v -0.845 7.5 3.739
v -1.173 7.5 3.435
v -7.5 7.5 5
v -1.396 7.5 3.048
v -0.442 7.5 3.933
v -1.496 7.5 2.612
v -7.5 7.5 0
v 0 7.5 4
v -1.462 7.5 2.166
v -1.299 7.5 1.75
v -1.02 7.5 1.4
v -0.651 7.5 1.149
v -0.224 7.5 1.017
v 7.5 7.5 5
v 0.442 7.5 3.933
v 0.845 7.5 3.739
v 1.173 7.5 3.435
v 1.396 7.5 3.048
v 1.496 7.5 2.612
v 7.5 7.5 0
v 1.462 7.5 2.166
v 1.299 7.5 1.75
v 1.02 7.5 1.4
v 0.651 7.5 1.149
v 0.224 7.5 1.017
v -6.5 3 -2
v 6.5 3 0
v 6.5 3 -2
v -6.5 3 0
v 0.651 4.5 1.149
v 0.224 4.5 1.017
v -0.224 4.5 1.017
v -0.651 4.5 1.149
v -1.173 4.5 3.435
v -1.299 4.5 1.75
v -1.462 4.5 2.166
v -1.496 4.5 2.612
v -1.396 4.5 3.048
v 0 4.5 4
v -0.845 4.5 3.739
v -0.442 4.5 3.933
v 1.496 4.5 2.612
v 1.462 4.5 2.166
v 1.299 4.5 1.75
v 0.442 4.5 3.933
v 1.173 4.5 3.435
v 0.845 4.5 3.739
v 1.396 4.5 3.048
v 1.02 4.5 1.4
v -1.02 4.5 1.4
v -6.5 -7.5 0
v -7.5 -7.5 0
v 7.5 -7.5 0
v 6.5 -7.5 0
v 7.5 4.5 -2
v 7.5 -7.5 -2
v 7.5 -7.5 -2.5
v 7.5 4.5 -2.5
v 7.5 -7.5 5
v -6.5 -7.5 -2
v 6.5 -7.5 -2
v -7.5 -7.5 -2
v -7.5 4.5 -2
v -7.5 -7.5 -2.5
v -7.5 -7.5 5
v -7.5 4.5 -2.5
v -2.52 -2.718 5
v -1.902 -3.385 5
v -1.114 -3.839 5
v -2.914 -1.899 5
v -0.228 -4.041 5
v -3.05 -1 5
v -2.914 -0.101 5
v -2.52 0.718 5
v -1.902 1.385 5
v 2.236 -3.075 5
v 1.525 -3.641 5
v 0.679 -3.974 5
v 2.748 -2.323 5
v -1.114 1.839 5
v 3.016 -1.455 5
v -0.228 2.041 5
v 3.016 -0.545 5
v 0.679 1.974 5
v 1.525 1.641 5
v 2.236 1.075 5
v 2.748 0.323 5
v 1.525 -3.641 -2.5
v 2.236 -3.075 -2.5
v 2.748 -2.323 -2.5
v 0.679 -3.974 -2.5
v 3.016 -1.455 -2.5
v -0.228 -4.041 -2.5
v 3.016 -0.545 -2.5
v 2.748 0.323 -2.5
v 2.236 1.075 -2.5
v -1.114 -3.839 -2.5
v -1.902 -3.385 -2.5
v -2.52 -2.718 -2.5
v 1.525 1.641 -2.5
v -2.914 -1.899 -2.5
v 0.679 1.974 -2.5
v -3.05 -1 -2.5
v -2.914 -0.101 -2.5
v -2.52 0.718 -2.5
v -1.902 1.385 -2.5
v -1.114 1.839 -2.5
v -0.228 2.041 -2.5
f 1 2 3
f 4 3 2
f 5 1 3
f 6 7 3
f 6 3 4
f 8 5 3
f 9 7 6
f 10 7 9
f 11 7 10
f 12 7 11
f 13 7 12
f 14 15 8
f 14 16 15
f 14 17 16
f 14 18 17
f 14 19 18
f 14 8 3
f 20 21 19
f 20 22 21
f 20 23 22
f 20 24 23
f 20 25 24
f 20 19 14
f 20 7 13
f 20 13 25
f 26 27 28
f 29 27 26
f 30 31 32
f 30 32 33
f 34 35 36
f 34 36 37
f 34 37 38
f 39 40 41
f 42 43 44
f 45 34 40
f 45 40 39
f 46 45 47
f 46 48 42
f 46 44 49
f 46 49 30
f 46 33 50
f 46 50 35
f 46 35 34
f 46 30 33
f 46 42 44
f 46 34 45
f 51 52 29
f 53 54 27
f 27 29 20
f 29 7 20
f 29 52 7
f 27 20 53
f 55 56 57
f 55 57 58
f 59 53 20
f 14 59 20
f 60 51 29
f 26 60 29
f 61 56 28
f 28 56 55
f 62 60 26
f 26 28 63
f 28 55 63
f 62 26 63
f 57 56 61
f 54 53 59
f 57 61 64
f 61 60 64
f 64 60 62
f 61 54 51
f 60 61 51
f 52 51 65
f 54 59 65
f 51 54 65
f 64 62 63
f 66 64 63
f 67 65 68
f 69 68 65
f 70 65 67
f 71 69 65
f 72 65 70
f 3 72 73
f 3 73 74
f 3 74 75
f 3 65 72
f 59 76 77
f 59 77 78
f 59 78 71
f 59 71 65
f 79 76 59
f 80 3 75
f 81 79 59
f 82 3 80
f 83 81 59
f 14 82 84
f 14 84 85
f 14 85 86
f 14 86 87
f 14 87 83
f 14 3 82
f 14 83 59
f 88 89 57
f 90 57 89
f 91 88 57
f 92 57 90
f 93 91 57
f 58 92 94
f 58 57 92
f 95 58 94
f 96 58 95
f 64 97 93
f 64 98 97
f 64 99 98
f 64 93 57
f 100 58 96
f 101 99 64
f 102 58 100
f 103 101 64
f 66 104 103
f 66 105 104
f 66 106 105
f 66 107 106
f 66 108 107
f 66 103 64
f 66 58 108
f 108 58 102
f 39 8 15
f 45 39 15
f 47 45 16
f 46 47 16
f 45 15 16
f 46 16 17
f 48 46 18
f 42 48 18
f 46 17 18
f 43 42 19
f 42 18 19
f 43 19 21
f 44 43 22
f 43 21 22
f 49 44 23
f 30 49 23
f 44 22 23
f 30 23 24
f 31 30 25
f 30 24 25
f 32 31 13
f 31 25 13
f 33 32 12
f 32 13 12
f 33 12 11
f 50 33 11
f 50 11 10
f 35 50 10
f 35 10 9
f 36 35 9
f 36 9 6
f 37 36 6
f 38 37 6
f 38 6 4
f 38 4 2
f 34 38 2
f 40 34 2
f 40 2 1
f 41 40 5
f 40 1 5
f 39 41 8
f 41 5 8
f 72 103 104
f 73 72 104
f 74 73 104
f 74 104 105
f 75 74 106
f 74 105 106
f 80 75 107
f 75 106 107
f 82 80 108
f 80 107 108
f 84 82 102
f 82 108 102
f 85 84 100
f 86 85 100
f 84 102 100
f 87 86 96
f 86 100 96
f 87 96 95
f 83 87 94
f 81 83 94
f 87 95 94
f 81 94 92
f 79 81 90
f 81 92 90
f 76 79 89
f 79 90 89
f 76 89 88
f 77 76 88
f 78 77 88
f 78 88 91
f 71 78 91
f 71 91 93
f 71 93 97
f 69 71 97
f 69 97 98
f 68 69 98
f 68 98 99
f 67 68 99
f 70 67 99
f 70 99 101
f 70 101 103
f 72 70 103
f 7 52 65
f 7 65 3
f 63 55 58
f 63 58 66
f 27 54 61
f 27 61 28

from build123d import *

# Parameters (mm, degrees)
ESQUISSE1_W             = 15
ESQUISSE1_H             = 15
BOSS_EXTRU_1_DEPTH      = 5
ESQUISSE2_R             = 1.5
ENL_V_MAT_EXTRU_1_DEPTH = 3
ESQUISSE3_W             = 13
ESQUISSE3_H             = 10.5
BOSS_EXTRU_2_DEPTH      = 2
ESQUISSE4_W             = 15
ESQUISSE4_H             = 12
BOSS_EXTRU_3_DEPTH      = 0.5
ESQUISSE5_R             = 3.05
ENL_V_MAT_EXTRU_2_DEPTH = 1
ESQUISSE5_3_R           = 3.05
ENL_V_MAT_EXTRU_3_DEPTH = 15


with BuildPart() as part:
    # Esquisse1 → Boss.-Extru.1 (new body)
    with BuildSketch(Plane.XY):
        Rectangle(ESQUISSE1_W, ESQUISSE1_H)
    extrude(amount=BOSS_EXTRU_1_DEPTH)

    # Esquisse2 → Enlèv. mat.-Extru.1 (cut)
    with BuildSketch(Plane(origin=(0, 7.5, 0), x_dir=(1, 0, 0), z_dir=(0, 1, 0))):
        with Locations((0, -2.5)):
            Circle(ESQUISSE2_R)
    extrude(amount=-ENL_V_MAT_EXTRU_1_DEPTH, mode=Mode.SUBTRACT)

    # Esquisse3 → Boss.-Extru.2 (add)
    with BuildSketch(Plane(origin=(0, 0, 0), x_dir=(-1, 0, 0), z_dir=(0, 0, -1))):
        with Locations((0, -2.25)):
            Rectangle(ESQUISSE3_W, ESQUISSE3_H)
    extrude(amount=BOSS_EXTRU_2_DEPTH)

    # Esquisse4 → Boss.-Extru.3 (add)
    with BuildSketch(Plane(origin=(0, 0, -2), x_dir=(-1, 0, 0), z_dir=(0, 0, -1))):
        with Locations((0, -1.5)):
            Rectangle(ESQUISSE4_W, ESQUISSE4_H)
    extrude(amount=BOSS_EXTRU_3_DEPTH)

    # Esquisse5 → Enlèv. mat.-Extru.2 (cut)
    with BuildSketch(Plane(origin=(0, 0, -2.5), x_dir=(-1, 0, 0), z_dir=(0, 0, -1))):
        with Locations((0, -1)):
            Circle(ESQUISSE5_R)
    extrude(amount=-ENL_V_MAT_EXTRU_2_DEPTH, mode=Mode.SUBTRACT)

    # Esquisse5<3> → Enlèv. mat.-Extru.3 (cut)
    with BuildSketch(Plane(origin=(0, 0, -2.5), x_dir=(-1, 0, 0), z_dir=(0, 0, -1))):
        with Locations((0, -1)):
            Circle(ESQUISSE5_3_R)
    extrude(amount=-ENL_V_MAT_EXTRU_3_DEPTH, mode=Mode.SUBTRACT)


solid = part.part
